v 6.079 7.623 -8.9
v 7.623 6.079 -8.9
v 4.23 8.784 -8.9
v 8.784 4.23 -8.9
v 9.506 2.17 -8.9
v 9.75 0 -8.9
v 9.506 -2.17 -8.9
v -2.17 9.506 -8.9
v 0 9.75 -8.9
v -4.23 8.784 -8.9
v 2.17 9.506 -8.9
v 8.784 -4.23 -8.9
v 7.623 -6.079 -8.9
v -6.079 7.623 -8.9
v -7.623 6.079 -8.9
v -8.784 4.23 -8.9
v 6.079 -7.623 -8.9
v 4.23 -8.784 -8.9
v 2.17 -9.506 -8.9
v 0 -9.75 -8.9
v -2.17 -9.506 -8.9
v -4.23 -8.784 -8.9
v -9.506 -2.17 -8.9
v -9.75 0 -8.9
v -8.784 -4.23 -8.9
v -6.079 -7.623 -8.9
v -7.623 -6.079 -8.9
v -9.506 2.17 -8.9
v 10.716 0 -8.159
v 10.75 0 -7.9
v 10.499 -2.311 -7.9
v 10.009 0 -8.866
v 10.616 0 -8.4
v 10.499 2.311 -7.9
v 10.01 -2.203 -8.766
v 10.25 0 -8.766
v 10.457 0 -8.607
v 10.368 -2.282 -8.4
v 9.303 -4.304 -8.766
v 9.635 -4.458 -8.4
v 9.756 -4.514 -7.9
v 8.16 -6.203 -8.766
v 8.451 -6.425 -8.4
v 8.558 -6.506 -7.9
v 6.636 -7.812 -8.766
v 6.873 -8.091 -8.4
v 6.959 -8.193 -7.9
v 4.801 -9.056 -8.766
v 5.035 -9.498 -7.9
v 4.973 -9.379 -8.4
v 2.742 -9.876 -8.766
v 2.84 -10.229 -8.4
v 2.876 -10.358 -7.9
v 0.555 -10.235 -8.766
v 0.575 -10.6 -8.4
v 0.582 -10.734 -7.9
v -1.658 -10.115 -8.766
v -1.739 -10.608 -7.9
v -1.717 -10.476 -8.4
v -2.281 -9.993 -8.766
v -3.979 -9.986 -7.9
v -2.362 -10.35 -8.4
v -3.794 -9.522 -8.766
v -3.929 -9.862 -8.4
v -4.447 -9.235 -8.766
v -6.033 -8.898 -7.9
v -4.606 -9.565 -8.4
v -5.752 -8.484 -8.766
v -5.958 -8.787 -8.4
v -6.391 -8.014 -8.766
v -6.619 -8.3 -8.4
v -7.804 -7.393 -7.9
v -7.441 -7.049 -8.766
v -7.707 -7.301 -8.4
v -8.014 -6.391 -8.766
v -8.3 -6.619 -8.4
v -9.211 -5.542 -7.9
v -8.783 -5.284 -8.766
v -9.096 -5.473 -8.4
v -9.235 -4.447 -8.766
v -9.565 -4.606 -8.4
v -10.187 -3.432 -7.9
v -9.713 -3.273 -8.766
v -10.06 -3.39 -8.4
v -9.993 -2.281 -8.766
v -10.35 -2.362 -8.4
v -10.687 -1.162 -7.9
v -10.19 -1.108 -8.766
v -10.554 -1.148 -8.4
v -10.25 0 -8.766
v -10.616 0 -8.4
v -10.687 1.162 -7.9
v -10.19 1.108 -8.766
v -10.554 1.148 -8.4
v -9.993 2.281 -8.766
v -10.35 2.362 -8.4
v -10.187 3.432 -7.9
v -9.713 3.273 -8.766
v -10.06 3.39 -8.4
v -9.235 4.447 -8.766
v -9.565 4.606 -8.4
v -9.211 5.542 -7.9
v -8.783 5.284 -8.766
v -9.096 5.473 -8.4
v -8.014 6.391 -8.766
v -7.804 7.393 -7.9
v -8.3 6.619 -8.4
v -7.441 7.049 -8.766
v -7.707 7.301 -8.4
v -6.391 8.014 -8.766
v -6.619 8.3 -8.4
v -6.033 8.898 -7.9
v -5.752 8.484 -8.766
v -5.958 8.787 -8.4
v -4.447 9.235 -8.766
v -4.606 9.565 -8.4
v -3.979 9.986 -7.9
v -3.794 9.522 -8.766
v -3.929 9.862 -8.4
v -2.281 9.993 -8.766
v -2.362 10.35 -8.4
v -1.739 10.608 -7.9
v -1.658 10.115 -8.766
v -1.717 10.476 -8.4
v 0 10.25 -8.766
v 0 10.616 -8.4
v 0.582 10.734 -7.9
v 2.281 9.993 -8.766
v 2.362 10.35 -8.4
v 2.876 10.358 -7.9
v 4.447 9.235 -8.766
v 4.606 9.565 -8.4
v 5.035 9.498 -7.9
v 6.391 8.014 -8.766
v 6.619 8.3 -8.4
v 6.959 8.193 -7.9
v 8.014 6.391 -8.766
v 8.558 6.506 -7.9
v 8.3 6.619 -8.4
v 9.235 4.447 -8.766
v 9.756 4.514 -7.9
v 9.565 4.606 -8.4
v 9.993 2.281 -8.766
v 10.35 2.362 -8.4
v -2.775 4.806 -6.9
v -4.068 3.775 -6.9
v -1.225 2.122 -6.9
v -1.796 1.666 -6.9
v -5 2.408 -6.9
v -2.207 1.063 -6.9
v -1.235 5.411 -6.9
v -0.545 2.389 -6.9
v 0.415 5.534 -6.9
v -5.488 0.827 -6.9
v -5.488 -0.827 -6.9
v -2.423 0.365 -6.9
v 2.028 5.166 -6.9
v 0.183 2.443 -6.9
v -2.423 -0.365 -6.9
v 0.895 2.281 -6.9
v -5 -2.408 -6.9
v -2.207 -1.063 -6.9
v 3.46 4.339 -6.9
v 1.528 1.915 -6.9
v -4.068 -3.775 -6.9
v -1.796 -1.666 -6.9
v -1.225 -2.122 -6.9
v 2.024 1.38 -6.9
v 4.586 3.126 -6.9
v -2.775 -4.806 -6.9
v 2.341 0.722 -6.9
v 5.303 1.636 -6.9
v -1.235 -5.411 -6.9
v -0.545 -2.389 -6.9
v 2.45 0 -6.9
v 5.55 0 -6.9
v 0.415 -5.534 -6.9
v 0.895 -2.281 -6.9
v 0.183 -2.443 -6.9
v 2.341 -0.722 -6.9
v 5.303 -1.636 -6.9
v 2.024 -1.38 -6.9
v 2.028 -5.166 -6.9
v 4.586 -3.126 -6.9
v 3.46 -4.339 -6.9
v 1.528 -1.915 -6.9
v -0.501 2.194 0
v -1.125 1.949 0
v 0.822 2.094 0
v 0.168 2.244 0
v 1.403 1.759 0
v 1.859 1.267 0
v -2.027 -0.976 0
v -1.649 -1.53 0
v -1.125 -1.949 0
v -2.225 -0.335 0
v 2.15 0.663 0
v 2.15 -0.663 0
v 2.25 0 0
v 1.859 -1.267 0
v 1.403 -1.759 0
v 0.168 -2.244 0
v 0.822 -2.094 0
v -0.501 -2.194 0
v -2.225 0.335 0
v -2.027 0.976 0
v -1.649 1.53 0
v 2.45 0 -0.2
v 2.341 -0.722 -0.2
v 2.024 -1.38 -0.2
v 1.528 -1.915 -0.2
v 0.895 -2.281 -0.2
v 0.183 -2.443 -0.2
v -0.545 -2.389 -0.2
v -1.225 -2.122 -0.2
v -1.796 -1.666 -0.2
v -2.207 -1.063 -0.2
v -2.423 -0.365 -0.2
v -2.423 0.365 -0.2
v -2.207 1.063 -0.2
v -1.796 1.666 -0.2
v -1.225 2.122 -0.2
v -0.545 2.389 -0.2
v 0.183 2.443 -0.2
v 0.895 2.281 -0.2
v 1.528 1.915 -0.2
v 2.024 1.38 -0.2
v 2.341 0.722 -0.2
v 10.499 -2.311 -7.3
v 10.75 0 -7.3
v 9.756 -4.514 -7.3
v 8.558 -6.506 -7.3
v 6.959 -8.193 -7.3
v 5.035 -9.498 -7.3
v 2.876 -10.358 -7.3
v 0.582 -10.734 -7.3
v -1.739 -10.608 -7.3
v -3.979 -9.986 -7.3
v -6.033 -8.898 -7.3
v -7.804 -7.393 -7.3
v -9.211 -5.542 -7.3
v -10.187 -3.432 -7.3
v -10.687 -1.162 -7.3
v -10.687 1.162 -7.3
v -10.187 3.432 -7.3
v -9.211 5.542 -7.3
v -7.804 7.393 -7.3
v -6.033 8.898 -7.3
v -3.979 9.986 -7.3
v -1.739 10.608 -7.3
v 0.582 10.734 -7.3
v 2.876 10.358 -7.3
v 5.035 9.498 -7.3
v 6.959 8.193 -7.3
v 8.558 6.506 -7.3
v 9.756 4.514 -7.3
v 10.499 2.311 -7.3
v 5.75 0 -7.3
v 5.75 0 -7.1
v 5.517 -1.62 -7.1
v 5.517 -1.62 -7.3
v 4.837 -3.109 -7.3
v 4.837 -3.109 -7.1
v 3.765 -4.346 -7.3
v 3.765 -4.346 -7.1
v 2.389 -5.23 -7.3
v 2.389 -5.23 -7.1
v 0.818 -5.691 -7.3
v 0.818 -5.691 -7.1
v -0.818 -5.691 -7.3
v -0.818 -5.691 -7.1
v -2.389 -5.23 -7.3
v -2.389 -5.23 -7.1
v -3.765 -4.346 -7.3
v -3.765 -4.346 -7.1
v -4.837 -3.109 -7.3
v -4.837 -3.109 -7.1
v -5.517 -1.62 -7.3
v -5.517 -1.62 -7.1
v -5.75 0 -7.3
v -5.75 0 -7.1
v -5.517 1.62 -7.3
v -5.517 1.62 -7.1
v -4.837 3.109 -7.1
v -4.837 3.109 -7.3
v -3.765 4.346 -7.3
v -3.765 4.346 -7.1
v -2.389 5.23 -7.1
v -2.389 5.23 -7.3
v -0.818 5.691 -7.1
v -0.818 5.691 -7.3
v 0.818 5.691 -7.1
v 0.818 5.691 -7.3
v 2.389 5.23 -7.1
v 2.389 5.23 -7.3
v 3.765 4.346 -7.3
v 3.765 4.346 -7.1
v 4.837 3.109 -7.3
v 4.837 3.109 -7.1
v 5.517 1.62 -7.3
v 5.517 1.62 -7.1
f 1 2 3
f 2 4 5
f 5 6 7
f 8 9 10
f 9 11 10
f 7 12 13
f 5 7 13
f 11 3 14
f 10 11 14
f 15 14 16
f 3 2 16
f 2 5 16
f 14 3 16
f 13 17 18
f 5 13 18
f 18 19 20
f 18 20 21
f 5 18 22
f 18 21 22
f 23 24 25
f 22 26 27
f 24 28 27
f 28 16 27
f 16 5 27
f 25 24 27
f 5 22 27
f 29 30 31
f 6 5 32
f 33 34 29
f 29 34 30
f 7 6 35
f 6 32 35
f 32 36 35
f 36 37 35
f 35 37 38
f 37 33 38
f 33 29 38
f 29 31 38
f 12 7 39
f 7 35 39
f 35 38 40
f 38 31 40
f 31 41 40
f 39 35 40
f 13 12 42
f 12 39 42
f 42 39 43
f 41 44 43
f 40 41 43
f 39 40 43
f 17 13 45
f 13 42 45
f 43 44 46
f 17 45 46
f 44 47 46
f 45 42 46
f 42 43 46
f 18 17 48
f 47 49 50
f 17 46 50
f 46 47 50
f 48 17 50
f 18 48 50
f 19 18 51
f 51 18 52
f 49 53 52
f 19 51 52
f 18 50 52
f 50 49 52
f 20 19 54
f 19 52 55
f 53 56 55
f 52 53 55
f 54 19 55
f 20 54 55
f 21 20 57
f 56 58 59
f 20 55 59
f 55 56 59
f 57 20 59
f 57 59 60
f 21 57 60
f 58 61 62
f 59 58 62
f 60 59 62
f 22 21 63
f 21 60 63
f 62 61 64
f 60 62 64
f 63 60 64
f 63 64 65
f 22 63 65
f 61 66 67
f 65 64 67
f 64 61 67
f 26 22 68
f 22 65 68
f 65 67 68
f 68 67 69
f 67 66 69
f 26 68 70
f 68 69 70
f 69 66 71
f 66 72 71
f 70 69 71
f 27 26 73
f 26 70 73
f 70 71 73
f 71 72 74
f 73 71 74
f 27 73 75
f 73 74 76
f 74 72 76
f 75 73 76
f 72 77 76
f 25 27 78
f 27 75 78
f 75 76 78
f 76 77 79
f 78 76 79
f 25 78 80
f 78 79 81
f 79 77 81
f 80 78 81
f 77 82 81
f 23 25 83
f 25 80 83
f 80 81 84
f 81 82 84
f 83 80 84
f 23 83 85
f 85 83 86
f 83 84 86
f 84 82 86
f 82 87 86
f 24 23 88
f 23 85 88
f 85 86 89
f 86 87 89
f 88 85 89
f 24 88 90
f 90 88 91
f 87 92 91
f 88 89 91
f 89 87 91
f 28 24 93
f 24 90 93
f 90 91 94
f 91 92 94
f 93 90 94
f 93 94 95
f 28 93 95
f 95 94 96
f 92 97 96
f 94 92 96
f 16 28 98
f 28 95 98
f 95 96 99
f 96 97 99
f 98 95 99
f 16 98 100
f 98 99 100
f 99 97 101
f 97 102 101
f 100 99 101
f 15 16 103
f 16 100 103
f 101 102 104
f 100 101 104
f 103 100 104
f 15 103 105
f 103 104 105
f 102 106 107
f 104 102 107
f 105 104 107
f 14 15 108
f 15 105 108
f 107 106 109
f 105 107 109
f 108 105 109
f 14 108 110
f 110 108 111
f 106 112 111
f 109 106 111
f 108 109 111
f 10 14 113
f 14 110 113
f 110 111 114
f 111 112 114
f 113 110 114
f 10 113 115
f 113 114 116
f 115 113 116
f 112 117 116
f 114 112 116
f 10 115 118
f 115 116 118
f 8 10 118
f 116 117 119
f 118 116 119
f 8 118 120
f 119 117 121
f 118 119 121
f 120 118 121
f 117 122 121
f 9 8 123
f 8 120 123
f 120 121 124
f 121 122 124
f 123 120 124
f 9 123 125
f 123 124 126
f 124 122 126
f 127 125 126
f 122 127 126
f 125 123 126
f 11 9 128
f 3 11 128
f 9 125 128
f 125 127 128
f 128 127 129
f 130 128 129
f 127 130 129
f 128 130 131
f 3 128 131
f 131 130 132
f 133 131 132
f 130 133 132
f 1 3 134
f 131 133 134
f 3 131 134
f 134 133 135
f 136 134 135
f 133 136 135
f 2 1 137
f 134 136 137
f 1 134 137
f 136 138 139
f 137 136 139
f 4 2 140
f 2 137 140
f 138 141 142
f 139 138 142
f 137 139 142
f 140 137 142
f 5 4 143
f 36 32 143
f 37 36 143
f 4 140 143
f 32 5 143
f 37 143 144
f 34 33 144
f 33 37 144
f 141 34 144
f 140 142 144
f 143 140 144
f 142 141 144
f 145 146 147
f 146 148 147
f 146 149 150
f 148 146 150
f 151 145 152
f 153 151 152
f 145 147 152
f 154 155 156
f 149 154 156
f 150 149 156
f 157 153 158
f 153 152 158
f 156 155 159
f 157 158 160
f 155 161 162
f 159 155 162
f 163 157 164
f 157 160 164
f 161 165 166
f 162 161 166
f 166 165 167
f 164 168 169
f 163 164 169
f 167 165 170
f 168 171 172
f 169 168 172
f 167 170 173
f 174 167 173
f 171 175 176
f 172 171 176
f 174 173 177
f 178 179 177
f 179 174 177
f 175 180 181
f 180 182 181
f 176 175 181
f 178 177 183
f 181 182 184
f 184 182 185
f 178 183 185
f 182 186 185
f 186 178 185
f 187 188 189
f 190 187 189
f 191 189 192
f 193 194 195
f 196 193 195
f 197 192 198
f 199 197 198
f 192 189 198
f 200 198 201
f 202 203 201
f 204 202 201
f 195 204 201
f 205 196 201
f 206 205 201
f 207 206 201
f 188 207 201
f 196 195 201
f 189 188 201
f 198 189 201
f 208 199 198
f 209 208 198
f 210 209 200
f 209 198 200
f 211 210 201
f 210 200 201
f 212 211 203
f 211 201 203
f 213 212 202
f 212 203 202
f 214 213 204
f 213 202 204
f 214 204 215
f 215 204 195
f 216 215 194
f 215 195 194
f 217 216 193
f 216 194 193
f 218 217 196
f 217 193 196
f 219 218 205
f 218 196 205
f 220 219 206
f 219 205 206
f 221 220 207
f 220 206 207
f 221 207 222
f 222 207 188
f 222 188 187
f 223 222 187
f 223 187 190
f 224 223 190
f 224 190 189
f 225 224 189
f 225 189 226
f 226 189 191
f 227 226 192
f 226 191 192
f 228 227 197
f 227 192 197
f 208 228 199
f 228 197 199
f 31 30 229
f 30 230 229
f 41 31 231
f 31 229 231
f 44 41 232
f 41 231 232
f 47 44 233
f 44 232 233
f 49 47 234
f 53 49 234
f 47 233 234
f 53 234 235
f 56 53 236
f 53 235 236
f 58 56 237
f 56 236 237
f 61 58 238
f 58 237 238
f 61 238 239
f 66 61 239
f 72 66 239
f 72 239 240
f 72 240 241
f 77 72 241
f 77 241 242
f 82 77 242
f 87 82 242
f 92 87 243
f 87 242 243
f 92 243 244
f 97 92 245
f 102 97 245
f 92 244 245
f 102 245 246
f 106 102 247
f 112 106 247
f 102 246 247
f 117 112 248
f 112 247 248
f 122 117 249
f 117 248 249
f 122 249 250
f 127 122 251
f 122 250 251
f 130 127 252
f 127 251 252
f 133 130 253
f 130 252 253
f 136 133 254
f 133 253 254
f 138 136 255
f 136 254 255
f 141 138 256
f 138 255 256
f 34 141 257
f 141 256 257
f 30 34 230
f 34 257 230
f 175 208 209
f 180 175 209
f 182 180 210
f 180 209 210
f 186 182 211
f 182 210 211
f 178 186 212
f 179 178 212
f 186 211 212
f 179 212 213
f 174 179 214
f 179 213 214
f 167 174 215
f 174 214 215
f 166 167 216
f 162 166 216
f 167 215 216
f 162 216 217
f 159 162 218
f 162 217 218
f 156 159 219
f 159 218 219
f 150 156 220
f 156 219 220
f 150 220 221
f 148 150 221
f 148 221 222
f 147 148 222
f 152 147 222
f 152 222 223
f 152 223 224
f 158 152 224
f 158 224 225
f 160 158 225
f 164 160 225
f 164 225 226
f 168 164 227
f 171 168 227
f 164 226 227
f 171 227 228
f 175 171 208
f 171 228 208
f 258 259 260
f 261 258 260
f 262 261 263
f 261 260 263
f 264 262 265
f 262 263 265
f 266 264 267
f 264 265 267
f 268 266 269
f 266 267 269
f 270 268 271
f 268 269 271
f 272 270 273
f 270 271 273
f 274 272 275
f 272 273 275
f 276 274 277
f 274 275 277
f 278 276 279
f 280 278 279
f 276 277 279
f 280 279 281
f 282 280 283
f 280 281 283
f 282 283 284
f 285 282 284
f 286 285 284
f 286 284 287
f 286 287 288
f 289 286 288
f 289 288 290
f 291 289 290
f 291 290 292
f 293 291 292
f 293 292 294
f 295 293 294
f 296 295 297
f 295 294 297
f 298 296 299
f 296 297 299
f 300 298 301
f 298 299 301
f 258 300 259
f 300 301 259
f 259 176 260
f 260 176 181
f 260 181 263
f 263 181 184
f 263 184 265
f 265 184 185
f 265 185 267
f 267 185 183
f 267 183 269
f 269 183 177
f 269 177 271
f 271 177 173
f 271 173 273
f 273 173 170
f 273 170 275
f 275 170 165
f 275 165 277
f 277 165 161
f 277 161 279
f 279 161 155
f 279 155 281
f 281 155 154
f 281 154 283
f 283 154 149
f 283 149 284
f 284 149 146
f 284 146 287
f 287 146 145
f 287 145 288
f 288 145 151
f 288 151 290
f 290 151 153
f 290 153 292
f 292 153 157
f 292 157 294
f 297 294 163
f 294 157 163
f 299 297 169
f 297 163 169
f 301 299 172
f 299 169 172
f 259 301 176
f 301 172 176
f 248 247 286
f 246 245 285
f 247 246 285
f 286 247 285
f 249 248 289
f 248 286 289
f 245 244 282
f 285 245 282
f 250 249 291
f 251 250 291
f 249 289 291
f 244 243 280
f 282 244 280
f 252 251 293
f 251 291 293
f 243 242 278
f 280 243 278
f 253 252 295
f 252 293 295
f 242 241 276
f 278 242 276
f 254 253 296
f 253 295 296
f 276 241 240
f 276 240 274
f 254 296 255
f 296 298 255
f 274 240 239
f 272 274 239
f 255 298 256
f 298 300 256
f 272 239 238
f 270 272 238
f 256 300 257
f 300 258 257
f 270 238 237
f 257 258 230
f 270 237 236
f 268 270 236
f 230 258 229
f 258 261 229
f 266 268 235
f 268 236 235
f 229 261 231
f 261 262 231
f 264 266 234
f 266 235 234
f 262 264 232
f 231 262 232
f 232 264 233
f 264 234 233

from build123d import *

# Parameters (mm, degrees)
CHAMFER1_SIZE = 0.2
CHAMFER2_SIZE = 0.2


with BuildPart() as part:
    # Sketch1 → Revolve1 (revolve)
    with BuildSketch(Plane(origin=(0, 0, 0), x_dir=(1, 0, 0), z_dir=(0, 1, 0))):
        with BuildLine():
            Line((2.45, 0), (0, 0))
            Line((0, 0), (0, 8.9))
            Line((0, 8.9), (9.75, 8.9))
            ThreePointArc((9.75, 8.9), (10.457106781, 8.607106781), (10.75, 7.9))
            Line((10.75, 7.9), (10.75, 7.3))
            Line((10.75, 7.3), (5.75, 7.3))
            Line((5.75, 7.3), (5.75, 6.9))
            Line((5.75, 6.9), (2.45, 6.9))
            Line((2.45, 6.9), (2.45, 0))
        make_face()
    revolve(axis=Axis((0, 0, 0), (0, 0, -1)))

    # Chamfer1
    chamfer1_edges = [part.edges().sort_by_distance(p)[0] for p in [
        (-5.75, 0, -6.9),
    ]]
    chamfer(chamfer1_edges, length=CHAMFER1_SIZE)

    # Chamfer2
    chamfer2_edges = [part.edges().sort_by_distance(p)[0] for p in [
        (-2.45, 0, 0),
    ]]
    chamfer(chamfer2_edges, length=CHAMFER2_SIZE)


solid = part.part
